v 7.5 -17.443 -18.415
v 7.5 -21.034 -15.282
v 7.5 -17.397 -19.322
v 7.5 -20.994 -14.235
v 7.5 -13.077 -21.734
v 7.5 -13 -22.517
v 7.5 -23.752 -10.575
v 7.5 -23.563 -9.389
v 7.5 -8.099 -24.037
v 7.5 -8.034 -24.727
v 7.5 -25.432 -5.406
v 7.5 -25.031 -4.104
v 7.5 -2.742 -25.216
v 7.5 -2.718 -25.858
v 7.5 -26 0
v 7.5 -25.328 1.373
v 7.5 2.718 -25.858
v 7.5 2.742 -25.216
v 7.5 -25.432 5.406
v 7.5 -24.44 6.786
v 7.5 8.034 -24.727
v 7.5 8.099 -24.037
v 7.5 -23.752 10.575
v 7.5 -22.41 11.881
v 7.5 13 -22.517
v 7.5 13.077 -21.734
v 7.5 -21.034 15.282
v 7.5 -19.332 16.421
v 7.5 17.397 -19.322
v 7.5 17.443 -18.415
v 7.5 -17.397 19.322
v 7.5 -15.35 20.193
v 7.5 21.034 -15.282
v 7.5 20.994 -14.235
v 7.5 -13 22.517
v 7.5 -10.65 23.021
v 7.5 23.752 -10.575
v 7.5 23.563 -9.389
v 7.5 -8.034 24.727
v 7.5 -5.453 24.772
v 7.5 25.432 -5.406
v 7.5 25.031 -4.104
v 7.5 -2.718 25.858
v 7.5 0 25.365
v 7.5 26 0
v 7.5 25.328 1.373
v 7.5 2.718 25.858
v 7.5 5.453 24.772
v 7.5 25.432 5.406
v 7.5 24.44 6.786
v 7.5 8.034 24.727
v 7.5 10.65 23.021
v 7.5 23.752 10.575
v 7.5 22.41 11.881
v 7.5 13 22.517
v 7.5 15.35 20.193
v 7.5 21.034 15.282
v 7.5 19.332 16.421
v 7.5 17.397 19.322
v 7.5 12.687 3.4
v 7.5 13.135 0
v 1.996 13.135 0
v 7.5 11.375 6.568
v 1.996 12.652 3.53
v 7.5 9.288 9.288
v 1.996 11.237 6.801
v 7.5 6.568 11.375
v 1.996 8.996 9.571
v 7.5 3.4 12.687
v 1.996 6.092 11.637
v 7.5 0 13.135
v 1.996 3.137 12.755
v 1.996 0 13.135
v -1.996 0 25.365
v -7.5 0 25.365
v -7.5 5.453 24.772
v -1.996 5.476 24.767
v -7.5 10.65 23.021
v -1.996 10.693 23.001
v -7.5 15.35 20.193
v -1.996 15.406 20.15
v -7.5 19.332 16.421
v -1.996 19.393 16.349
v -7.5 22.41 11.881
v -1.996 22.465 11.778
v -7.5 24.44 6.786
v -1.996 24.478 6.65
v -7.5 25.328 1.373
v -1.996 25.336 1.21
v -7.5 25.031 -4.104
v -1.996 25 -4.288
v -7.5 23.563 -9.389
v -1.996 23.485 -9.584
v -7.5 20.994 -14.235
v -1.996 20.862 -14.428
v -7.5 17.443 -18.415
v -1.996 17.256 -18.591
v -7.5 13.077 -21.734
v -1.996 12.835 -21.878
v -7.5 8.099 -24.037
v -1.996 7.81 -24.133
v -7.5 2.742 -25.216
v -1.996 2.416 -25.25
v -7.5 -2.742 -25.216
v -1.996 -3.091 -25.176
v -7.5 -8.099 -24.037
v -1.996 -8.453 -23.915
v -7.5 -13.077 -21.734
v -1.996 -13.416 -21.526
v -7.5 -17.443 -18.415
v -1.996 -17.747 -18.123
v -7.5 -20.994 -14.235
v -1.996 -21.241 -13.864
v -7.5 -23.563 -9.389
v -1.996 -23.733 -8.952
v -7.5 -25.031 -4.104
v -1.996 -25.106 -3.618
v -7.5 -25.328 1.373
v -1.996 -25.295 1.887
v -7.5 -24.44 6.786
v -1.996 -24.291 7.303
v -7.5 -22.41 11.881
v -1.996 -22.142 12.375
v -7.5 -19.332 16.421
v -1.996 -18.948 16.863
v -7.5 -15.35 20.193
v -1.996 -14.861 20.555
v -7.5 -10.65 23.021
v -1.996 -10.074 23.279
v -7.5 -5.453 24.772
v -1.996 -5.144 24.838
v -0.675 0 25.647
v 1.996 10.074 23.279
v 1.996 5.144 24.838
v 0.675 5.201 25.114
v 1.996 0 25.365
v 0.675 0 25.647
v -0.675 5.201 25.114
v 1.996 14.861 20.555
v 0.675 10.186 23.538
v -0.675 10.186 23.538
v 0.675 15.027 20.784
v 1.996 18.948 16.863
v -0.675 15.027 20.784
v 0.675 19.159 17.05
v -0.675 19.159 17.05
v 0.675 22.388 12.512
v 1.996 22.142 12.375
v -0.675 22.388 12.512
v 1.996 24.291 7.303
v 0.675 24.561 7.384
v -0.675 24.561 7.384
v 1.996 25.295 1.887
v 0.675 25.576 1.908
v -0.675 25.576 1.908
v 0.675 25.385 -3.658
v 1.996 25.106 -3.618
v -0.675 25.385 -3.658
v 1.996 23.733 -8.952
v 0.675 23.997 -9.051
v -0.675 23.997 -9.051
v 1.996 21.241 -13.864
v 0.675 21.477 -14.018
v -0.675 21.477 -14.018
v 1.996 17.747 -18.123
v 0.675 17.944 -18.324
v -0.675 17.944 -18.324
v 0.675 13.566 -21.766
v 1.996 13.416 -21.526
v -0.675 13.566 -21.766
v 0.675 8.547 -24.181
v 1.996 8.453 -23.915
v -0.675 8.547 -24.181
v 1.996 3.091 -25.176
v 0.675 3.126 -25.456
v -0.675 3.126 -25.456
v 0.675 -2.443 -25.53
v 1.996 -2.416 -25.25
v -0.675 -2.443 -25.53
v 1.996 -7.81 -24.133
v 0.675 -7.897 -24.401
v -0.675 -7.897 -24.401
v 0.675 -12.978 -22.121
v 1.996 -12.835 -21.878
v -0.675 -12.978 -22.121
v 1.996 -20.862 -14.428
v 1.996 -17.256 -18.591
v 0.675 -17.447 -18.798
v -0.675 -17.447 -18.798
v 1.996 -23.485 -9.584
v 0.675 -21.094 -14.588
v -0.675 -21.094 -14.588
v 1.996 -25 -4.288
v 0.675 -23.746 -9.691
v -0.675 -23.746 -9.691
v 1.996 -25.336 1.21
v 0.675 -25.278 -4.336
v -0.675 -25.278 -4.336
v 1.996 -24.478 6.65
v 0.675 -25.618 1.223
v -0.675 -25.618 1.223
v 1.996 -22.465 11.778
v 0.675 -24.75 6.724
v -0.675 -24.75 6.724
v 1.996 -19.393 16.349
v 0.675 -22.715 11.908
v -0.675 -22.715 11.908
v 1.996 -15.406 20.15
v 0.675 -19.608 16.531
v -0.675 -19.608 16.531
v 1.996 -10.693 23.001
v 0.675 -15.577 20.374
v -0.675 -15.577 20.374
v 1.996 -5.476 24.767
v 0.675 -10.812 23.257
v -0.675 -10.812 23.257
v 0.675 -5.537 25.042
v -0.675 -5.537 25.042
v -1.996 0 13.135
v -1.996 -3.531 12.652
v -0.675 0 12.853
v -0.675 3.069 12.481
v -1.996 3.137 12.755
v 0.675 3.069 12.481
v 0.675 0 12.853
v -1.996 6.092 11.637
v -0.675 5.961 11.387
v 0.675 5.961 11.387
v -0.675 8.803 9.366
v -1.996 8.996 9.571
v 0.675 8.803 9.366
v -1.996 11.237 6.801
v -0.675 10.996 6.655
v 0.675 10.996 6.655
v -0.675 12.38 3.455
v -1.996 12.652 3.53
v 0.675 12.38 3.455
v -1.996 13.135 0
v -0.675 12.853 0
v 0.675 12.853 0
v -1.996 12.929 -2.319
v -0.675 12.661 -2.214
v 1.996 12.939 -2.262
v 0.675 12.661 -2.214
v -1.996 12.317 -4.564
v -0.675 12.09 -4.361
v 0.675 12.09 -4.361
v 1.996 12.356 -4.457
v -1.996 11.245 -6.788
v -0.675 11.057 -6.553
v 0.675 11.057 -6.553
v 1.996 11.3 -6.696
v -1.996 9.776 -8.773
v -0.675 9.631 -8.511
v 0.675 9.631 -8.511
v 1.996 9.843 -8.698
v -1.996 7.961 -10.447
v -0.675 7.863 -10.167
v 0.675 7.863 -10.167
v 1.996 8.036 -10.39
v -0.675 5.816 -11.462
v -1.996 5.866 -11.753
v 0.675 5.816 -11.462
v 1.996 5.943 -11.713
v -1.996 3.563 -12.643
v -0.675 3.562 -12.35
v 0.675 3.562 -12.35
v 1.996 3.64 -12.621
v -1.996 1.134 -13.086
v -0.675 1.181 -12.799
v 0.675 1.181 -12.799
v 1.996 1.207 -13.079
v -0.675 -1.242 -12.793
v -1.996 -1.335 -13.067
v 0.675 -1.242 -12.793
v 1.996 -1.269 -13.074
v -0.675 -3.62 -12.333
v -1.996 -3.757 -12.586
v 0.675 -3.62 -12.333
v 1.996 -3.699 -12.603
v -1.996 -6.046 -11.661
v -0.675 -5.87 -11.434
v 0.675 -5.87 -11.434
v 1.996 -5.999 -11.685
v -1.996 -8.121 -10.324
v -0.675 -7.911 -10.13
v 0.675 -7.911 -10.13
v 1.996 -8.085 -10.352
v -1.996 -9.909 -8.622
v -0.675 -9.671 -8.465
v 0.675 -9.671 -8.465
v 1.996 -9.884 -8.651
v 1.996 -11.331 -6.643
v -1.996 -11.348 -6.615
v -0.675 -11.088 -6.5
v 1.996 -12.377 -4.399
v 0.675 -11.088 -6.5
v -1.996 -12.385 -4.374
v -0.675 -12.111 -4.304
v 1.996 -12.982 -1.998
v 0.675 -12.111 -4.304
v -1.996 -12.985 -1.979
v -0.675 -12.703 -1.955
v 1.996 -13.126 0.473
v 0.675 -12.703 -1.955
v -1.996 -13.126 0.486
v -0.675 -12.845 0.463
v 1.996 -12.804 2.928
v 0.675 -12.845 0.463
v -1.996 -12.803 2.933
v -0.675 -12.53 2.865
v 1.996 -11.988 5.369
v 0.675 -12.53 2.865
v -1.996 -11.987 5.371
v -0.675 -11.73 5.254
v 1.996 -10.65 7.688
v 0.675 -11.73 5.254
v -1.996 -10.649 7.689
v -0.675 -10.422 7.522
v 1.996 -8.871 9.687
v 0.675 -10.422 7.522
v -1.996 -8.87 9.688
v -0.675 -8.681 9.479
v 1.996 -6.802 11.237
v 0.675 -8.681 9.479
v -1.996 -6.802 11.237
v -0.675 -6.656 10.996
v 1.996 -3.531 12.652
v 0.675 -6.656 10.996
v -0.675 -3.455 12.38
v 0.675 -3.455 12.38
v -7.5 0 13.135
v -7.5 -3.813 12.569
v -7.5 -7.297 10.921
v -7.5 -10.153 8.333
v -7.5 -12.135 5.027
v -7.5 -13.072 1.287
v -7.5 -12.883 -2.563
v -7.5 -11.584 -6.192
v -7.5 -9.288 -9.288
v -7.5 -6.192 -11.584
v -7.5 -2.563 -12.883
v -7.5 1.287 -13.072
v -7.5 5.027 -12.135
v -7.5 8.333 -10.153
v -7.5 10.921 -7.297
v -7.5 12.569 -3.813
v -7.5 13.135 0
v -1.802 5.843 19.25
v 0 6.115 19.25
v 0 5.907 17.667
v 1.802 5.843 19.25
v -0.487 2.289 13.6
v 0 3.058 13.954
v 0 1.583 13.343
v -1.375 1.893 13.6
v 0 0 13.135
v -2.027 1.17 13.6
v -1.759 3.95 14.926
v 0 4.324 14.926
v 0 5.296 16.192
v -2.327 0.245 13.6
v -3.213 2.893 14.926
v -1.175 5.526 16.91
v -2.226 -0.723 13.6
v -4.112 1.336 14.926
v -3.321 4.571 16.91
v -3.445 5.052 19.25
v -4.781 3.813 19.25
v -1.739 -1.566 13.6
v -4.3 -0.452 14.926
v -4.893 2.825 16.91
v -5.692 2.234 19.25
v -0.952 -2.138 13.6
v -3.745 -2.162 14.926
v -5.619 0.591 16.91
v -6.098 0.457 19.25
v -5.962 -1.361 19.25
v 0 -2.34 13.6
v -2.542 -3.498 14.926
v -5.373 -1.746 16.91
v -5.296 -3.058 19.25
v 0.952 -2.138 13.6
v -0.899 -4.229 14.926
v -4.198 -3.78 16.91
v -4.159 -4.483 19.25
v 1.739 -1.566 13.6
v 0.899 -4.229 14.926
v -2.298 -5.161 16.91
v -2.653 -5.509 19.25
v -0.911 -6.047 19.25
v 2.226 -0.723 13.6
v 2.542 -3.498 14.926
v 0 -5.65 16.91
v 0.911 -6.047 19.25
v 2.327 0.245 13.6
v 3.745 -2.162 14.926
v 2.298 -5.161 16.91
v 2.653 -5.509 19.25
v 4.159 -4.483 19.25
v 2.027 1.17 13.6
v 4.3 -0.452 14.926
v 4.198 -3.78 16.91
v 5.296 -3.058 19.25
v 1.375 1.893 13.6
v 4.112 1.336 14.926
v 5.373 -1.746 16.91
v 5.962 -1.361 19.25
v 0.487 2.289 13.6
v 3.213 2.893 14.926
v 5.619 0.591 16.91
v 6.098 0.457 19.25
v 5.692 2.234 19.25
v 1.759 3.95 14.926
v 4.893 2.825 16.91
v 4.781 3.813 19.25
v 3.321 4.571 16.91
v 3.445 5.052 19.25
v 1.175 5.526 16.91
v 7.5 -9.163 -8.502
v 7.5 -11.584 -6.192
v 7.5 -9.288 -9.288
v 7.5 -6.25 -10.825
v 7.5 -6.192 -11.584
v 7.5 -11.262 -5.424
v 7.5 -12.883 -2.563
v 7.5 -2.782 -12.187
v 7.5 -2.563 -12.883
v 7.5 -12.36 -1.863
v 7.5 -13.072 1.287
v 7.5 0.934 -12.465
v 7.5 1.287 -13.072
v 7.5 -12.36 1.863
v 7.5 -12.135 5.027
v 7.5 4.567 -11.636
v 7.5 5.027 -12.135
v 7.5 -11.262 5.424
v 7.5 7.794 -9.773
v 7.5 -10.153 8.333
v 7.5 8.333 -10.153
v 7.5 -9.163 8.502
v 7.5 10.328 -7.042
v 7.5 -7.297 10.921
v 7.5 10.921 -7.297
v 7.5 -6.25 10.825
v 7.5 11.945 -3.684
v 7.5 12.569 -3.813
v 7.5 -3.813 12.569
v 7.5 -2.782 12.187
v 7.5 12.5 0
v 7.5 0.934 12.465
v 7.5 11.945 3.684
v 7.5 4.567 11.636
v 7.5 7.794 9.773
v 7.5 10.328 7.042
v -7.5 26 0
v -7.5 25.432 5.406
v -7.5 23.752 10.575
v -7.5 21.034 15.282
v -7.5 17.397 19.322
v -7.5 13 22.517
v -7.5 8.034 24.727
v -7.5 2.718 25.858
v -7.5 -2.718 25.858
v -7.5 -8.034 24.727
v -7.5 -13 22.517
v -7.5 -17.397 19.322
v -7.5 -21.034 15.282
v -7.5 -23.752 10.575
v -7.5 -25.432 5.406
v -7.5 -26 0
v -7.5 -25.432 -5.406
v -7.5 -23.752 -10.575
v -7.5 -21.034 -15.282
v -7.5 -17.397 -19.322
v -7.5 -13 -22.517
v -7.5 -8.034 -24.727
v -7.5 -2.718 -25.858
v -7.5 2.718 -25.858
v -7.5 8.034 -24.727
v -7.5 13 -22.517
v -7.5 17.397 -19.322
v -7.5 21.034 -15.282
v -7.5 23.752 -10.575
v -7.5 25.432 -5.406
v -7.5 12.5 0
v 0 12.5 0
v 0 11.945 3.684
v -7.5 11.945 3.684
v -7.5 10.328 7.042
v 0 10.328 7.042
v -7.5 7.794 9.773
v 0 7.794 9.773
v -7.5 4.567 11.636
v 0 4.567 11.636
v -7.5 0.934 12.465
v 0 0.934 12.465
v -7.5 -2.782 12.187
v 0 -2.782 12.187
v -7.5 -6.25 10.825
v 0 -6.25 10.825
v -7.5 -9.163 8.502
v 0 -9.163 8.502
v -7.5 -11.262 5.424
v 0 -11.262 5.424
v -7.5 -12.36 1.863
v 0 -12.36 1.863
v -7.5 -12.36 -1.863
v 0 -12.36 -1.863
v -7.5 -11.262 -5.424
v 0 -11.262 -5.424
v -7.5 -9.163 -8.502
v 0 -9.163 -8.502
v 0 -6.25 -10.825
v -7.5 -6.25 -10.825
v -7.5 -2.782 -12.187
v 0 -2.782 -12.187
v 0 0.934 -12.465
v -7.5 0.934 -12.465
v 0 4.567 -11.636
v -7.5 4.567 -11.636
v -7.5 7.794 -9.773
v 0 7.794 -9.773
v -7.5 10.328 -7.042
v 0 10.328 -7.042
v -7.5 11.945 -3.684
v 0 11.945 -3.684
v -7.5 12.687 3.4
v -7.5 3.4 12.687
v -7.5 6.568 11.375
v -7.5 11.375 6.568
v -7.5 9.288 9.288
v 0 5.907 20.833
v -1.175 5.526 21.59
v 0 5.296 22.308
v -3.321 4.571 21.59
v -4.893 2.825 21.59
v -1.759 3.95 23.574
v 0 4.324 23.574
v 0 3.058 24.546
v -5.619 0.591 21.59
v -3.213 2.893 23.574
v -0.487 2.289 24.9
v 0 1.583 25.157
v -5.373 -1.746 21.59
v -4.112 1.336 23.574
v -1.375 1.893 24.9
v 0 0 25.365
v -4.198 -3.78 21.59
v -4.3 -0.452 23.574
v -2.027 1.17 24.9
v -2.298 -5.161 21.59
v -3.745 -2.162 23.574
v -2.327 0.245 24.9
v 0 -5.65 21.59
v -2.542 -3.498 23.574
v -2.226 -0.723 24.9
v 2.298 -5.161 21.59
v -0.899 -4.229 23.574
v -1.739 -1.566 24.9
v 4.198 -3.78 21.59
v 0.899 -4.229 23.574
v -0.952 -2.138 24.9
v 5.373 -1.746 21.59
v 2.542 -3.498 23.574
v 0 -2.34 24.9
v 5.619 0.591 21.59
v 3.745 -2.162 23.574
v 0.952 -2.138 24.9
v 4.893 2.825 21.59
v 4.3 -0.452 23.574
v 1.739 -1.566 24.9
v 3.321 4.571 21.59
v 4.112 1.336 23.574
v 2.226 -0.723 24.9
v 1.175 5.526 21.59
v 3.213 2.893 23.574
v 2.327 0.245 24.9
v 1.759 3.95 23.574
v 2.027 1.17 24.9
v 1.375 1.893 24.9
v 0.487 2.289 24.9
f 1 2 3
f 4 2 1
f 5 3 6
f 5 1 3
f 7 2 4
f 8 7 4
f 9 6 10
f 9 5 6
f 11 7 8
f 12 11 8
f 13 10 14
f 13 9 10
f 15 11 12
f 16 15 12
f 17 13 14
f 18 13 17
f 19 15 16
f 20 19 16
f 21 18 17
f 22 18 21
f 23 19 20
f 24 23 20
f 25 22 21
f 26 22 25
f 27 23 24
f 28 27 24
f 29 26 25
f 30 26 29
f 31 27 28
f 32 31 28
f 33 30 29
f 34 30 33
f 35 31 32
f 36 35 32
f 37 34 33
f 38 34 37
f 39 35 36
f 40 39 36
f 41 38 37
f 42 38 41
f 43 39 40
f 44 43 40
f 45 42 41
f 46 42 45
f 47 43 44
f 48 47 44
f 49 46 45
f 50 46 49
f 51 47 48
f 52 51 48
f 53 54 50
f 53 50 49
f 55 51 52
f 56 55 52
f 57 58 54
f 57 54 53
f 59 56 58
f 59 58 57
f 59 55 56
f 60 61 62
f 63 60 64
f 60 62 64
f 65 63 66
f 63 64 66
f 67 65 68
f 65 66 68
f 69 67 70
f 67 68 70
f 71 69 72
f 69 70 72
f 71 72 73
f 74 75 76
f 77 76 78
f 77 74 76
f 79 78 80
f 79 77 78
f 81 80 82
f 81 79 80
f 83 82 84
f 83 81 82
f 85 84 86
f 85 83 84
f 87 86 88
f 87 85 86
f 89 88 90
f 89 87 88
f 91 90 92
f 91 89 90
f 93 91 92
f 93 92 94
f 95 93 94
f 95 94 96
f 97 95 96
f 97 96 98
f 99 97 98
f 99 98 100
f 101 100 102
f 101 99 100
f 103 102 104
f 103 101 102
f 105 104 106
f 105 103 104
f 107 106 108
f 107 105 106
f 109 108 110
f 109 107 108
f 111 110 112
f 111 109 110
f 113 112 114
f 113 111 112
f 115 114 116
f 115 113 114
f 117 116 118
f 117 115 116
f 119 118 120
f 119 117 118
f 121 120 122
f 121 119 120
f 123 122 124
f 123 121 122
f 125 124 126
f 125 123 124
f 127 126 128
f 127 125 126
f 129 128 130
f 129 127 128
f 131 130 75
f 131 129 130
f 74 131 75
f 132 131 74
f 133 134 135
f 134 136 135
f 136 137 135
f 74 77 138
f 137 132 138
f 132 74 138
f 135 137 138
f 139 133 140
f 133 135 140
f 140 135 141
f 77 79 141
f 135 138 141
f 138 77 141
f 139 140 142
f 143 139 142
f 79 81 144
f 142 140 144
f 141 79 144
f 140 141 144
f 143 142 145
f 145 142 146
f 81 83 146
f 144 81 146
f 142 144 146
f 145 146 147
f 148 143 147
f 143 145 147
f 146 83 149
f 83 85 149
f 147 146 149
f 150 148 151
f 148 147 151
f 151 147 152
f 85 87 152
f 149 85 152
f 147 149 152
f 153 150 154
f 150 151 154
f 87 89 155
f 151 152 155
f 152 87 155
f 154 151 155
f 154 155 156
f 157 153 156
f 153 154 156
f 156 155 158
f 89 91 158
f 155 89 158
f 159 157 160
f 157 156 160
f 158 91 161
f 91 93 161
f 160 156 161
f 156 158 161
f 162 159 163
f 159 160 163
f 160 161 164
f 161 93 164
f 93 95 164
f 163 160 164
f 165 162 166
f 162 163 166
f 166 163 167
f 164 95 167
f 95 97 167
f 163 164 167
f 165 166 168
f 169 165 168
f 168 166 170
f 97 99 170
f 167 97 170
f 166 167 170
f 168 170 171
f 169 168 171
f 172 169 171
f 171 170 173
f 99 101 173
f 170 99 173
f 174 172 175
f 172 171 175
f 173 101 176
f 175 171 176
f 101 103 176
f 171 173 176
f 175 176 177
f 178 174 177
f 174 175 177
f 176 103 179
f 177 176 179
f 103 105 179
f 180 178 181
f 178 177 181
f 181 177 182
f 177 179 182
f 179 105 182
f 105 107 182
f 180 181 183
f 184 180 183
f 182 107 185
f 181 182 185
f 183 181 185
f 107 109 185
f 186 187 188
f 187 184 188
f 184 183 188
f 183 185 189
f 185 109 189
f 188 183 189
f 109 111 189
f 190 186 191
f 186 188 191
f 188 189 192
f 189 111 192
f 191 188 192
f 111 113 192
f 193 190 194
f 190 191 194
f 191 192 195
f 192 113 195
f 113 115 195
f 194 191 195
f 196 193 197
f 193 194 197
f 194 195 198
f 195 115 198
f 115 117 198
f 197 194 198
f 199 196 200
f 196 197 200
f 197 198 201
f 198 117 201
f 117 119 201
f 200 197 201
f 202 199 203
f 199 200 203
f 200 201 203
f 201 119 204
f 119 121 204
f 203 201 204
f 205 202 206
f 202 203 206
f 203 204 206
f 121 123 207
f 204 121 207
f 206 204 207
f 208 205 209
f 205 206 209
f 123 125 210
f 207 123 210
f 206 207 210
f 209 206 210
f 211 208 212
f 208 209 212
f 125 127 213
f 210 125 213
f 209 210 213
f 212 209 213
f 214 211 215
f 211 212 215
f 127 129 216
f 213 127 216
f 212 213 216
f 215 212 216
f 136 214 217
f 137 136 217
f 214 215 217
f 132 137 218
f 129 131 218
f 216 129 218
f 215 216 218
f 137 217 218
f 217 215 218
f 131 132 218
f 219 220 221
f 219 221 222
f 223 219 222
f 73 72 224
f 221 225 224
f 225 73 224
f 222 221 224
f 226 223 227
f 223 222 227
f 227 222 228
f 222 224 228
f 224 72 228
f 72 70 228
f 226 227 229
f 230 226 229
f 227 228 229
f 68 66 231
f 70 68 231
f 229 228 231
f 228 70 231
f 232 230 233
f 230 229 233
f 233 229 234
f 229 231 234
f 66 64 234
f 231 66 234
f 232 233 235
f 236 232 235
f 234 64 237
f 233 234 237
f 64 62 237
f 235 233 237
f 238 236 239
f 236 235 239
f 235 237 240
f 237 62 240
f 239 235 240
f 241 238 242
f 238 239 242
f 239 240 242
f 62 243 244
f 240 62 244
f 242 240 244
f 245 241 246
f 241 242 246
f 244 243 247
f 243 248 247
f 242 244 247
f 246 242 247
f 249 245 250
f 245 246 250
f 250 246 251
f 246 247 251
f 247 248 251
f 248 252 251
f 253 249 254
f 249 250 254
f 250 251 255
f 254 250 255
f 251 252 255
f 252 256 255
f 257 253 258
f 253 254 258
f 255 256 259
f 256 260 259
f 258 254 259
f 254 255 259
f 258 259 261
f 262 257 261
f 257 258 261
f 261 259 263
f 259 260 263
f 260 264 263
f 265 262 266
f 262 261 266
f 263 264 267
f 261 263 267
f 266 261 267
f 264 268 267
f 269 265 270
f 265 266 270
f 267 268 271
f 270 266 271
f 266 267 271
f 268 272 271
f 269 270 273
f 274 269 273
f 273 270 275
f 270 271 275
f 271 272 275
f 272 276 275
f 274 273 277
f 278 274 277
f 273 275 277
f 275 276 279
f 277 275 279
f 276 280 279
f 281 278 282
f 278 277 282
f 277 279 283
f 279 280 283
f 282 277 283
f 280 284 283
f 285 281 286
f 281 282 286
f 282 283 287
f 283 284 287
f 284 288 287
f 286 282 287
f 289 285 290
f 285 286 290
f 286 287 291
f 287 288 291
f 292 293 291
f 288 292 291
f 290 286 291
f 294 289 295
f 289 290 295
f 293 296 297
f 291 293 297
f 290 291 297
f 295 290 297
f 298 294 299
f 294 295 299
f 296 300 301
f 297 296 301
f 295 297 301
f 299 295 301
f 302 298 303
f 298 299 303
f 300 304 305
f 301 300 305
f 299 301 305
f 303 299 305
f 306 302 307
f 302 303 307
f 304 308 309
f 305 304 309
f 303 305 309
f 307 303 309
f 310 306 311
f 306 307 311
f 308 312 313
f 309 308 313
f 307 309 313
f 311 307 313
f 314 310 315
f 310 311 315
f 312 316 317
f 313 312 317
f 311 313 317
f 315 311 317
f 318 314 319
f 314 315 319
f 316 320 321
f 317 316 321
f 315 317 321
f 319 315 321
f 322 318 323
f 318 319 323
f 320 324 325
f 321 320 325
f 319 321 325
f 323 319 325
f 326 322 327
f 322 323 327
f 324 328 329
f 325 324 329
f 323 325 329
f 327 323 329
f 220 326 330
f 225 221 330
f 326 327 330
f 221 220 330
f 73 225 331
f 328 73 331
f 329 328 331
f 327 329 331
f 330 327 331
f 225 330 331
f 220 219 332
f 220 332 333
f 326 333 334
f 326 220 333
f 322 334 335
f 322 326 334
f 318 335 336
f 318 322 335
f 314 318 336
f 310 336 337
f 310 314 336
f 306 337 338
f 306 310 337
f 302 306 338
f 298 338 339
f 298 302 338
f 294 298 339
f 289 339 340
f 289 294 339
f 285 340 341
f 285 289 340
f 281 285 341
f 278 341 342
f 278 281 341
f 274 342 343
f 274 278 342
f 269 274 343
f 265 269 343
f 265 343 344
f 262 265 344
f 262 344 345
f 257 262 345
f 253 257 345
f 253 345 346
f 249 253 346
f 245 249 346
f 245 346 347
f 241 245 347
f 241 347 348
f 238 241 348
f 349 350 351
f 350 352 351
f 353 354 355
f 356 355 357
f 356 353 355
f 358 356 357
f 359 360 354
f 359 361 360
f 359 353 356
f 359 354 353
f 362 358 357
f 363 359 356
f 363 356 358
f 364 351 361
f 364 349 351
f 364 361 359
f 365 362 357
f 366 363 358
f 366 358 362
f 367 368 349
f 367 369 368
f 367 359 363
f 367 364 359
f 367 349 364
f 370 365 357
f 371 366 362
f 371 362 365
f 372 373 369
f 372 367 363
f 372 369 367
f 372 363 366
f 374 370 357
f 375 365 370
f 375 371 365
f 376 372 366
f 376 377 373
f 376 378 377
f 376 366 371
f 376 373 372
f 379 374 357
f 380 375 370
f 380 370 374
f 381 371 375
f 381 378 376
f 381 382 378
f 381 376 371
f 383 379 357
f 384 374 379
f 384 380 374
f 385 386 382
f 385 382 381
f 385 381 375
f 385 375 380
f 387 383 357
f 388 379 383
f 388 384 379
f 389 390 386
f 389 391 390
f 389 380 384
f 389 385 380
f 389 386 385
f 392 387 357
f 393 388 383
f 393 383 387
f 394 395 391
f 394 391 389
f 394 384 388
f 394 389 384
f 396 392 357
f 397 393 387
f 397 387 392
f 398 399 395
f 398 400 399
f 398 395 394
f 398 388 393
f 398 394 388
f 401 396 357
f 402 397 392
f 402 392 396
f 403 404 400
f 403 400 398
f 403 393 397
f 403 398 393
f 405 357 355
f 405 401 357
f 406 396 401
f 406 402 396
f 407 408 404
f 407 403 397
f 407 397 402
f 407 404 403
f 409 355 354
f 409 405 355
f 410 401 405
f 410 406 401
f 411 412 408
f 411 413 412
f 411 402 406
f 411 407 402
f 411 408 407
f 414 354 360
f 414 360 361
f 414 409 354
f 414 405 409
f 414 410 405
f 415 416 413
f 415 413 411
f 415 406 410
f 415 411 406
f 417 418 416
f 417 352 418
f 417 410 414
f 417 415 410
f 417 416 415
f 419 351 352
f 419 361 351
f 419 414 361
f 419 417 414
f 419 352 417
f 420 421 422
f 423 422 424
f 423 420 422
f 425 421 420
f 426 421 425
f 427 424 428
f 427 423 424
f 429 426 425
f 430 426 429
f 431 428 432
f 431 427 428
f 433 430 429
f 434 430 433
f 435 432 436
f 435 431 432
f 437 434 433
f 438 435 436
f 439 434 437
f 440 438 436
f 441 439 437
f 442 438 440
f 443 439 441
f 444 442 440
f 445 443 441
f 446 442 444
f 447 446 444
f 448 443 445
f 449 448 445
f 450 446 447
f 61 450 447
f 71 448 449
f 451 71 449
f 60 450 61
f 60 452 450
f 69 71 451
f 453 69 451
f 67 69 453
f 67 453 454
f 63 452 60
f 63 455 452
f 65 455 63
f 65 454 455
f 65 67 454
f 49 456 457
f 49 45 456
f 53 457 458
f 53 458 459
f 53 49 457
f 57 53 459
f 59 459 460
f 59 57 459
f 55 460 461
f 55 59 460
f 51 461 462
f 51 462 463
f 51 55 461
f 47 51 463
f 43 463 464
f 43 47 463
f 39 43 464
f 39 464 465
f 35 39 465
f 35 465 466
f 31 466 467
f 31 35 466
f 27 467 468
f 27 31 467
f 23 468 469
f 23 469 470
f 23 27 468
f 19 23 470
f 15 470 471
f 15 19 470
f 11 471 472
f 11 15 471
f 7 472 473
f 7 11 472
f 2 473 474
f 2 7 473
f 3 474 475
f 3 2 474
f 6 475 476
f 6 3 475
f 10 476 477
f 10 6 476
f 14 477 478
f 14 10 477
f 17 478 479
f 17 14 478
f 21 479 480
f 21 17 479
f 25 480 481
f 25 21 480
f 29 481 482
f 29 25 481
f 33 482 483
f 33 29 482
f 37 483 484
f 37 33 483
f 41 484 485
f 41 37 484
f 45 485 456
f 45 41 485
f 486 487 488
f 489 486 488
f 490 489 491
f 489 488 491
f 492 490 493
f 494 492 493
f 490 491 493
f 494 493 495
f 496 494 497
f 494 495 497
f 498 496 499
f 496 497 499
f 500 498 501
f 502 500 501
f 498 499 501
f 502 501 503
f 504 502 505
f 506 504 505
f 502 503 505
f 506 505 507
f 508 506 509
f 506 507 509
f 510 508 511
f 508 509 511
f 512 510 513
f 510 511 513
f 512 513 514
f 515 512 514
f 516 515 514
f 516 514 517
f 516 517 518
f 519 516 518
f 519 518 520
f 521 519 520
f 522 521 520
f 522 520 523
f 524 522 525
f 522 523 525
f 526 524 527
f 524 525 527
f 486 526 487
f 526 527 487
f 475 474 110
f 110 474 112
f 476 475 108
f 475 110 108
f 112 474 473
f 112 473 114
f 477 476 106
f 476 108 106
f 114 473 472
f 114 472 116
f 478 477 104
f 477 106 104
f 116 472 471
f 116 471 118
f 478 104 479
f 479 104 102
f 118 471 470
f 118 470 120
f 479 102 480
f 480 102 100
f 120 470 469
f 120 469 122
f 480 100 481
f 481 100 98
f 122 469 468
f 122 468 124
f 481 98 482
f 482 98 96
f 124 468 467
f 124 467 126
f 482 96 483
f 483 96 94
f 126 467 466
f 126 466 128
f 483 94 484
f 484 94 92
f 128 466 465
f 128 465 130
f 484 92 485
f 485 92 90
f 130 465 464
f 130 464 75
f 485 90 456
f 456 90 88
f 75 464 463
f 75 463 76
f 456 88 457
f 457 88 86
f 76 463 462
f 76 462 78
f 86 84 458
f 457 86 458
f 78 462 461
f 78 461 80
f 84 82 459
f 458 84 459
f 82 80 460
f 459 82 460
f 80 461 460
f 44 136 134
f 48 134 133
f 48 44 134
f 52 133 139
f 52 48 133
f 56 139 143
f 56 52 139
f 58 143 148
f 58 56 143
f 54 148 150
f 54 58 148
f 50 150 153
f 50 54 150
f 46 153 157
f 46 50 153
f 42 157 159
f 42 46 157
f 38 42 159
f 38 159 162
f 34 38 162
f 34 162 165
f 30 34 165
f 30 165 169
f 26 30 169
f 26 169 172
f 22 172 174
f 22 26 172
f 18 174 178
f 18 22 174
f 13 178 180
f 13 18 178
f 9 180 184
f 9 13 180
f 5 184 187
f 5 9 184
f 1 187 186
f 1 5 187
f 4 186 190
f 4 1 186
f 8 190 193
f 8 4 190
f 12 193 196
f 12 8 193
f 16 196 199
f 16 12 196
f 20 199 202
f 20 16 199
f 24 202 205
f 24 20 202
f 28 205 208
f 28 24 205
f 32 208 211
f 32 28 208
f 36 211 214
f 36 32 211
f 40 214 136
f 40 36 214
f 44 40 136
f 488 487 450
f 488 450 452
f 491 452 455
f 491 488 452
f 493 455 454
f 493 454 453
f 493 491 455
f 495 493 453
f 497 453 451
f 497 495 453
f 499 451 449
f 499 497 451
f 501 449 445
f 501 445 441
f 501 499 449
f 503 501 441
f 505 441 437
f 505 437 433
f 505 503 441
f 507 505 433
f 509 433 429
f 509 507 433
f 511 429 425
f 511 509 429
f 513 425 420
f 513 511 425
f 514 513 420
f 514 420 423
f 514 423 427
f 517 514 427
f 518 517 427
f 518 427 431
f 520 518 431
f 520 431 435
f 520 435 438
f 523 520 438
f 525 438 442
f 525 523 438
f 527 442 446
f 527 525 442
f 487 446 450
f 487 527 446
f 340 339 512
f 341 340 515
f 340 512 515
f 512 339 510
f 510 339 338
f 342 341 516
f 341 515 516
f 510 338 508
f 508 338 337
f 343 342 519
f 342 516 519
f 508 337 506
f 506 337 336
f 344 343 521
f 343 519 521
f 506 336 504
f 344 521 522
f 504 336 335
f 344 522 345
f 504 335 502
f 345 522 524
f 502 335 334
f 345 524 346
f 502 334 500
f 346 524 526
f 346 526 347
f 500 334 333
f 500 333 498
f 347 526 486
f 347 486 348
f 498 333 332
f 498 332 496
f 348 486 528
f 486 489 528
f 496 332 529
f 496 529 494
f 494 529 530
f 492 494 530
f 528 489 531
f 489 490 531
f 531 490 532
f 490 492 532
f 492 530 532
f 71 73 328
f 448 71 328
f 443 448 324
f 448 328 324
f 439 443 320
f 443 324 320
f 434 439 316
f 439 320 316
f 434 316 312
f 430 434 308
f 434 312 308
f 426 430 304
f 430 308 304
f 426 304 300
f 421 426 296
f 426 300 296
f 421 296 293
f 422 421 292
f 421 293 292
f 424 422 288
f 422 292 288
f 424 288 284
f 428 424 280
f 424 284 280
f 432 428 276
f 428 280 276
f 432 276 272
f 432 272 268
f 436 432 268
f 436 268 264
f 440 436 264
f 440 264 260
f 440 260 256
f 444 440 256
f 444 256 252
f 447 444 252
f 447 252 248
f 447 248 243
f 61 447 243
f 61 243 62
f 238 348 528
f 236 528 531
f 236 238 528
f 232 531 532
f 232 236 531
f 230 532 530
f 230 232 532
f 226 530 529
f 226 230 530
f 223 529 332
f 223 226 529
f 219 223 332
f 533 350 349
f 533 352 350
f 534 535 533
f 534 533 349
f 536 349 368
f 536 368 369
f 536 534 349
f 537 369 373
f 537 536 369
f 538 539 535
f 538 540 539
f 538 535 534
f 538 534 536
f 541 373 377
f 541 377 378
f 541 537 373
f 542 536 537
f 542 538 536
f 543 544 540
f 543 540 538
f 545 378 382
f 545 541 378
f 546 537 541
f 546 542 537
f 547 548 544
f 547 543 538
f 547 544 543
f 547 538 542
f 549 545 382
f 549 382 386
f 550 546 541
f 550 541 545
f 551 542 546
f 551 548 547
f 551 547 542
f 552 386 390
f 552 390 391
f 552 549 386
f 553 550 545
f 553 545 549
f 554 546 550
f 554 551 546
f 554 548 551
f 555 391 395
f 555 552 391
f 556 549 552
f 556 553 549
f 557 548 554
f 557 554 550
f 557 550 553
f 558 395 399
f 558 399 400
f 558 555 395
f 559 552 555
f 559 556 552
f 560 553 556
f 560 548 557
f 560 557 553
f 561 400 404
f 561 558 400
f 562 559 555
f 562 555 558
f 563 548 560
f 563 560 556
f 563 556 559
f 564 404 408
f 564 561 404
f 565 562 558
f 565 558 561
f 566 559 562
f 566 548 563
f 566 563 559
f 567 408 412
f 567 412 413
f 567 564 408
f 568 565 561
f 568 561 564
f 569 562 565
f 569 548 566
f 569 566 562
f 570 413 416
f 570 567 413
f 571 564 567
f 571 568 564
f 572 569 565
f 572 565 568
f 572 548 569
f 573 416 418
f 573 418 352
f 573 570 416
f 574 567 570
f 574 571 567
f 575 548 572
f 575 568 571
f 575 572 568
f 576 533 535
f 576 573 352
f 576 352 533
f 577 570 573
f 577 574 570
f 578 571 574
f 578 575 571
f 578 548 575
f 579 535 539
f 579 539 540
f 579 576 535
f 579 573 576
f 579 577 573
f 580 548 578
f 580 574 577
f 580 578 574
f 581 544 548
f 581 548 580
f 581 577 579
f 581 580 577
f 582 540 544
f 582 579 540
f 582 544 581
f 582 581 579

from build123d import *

# Parameters (mm, degrees)
F0_R     = 12.5
F1_DEPTH = 7.5
F0_R_2   = 26
F2_R     = 6.4324992


with BuildPart() as f1:
    # F0 (on Right) → F1 (new body, symmetric)
    with BuildSketch(Plane.YZ):
        with BuildLine():
            ThreePointArc((0, 13.135), (-9.2878475709, -9.2878475709), (13.135, 0))
            ThreePointArc((13.135, 0), (9.2878475709, 9.2878475709), (0, 13.135))
        make_face()
        Circle(F0_R, mode=Mode.SUBTRACT)
    extrude(amount=F1_DEPTH, both=True)


with BuildPart() as f1b:
    # F0 (on Right) → F1, piece 2 (new body, symmetric)
    with BuildSketch(Plane.YZ):
        Circle(F0_R_2)
        with BuildLine():
            ThreePointArc((25.365, 0), (-17.9357635048, -17.9357635048), (0, 25.365))
            ThreePointArc((0, 25.365), (17.9357635048, 17.9357635048), (25.365, 0))
        make_face(mode=Mode.SUBTRACT)
    extrude(amount=F1_DEPTH, both=True)


with BuildPart() as f3_tool:
    # F2 (on Front) → F3 (revolve)
    with BuildSketch(Plane.XZ):
        with Locations((0, 19.2499996)):
            Circle(F2_R)
    revolve(axis=Axis((0, 0, 0), (-1, 0, 0)))


with BuildPart() as f1_1:
    add(f1.part)

    # F3: cut by f3_tool
    add(f3_tool.part, mode=Mode.SUBTRACT)


with BuildPart() as f1b_1:
    add(f1b.part)

    # F3: cut by f3_tool
    add(f3_tool.part, mode=Mode.SUBTRACT)


with BuildPart() as f4:
    # F0 (on Right) → F4 (revolve)
    with BuildSketch(Plane.YZ):
        with BuildLine():
            Line((0, 19.25), (0, 13.135))
            ThreePointArc((0, 13.135), (4.323957967, 14.926042033), (6.115, 19.25))
            ThreePointArc((6.115, 19.25), (4.323957967, 23.573957967), (0, 25.365))
            Line((0, 25.365), (0, 19.25))
        make_face()
    revolve(axis=Axis((0, 0, 22.3075), (0, 0, 1)))


solid = Compound([f1_1.part, f1b_1.part, f4.part])
